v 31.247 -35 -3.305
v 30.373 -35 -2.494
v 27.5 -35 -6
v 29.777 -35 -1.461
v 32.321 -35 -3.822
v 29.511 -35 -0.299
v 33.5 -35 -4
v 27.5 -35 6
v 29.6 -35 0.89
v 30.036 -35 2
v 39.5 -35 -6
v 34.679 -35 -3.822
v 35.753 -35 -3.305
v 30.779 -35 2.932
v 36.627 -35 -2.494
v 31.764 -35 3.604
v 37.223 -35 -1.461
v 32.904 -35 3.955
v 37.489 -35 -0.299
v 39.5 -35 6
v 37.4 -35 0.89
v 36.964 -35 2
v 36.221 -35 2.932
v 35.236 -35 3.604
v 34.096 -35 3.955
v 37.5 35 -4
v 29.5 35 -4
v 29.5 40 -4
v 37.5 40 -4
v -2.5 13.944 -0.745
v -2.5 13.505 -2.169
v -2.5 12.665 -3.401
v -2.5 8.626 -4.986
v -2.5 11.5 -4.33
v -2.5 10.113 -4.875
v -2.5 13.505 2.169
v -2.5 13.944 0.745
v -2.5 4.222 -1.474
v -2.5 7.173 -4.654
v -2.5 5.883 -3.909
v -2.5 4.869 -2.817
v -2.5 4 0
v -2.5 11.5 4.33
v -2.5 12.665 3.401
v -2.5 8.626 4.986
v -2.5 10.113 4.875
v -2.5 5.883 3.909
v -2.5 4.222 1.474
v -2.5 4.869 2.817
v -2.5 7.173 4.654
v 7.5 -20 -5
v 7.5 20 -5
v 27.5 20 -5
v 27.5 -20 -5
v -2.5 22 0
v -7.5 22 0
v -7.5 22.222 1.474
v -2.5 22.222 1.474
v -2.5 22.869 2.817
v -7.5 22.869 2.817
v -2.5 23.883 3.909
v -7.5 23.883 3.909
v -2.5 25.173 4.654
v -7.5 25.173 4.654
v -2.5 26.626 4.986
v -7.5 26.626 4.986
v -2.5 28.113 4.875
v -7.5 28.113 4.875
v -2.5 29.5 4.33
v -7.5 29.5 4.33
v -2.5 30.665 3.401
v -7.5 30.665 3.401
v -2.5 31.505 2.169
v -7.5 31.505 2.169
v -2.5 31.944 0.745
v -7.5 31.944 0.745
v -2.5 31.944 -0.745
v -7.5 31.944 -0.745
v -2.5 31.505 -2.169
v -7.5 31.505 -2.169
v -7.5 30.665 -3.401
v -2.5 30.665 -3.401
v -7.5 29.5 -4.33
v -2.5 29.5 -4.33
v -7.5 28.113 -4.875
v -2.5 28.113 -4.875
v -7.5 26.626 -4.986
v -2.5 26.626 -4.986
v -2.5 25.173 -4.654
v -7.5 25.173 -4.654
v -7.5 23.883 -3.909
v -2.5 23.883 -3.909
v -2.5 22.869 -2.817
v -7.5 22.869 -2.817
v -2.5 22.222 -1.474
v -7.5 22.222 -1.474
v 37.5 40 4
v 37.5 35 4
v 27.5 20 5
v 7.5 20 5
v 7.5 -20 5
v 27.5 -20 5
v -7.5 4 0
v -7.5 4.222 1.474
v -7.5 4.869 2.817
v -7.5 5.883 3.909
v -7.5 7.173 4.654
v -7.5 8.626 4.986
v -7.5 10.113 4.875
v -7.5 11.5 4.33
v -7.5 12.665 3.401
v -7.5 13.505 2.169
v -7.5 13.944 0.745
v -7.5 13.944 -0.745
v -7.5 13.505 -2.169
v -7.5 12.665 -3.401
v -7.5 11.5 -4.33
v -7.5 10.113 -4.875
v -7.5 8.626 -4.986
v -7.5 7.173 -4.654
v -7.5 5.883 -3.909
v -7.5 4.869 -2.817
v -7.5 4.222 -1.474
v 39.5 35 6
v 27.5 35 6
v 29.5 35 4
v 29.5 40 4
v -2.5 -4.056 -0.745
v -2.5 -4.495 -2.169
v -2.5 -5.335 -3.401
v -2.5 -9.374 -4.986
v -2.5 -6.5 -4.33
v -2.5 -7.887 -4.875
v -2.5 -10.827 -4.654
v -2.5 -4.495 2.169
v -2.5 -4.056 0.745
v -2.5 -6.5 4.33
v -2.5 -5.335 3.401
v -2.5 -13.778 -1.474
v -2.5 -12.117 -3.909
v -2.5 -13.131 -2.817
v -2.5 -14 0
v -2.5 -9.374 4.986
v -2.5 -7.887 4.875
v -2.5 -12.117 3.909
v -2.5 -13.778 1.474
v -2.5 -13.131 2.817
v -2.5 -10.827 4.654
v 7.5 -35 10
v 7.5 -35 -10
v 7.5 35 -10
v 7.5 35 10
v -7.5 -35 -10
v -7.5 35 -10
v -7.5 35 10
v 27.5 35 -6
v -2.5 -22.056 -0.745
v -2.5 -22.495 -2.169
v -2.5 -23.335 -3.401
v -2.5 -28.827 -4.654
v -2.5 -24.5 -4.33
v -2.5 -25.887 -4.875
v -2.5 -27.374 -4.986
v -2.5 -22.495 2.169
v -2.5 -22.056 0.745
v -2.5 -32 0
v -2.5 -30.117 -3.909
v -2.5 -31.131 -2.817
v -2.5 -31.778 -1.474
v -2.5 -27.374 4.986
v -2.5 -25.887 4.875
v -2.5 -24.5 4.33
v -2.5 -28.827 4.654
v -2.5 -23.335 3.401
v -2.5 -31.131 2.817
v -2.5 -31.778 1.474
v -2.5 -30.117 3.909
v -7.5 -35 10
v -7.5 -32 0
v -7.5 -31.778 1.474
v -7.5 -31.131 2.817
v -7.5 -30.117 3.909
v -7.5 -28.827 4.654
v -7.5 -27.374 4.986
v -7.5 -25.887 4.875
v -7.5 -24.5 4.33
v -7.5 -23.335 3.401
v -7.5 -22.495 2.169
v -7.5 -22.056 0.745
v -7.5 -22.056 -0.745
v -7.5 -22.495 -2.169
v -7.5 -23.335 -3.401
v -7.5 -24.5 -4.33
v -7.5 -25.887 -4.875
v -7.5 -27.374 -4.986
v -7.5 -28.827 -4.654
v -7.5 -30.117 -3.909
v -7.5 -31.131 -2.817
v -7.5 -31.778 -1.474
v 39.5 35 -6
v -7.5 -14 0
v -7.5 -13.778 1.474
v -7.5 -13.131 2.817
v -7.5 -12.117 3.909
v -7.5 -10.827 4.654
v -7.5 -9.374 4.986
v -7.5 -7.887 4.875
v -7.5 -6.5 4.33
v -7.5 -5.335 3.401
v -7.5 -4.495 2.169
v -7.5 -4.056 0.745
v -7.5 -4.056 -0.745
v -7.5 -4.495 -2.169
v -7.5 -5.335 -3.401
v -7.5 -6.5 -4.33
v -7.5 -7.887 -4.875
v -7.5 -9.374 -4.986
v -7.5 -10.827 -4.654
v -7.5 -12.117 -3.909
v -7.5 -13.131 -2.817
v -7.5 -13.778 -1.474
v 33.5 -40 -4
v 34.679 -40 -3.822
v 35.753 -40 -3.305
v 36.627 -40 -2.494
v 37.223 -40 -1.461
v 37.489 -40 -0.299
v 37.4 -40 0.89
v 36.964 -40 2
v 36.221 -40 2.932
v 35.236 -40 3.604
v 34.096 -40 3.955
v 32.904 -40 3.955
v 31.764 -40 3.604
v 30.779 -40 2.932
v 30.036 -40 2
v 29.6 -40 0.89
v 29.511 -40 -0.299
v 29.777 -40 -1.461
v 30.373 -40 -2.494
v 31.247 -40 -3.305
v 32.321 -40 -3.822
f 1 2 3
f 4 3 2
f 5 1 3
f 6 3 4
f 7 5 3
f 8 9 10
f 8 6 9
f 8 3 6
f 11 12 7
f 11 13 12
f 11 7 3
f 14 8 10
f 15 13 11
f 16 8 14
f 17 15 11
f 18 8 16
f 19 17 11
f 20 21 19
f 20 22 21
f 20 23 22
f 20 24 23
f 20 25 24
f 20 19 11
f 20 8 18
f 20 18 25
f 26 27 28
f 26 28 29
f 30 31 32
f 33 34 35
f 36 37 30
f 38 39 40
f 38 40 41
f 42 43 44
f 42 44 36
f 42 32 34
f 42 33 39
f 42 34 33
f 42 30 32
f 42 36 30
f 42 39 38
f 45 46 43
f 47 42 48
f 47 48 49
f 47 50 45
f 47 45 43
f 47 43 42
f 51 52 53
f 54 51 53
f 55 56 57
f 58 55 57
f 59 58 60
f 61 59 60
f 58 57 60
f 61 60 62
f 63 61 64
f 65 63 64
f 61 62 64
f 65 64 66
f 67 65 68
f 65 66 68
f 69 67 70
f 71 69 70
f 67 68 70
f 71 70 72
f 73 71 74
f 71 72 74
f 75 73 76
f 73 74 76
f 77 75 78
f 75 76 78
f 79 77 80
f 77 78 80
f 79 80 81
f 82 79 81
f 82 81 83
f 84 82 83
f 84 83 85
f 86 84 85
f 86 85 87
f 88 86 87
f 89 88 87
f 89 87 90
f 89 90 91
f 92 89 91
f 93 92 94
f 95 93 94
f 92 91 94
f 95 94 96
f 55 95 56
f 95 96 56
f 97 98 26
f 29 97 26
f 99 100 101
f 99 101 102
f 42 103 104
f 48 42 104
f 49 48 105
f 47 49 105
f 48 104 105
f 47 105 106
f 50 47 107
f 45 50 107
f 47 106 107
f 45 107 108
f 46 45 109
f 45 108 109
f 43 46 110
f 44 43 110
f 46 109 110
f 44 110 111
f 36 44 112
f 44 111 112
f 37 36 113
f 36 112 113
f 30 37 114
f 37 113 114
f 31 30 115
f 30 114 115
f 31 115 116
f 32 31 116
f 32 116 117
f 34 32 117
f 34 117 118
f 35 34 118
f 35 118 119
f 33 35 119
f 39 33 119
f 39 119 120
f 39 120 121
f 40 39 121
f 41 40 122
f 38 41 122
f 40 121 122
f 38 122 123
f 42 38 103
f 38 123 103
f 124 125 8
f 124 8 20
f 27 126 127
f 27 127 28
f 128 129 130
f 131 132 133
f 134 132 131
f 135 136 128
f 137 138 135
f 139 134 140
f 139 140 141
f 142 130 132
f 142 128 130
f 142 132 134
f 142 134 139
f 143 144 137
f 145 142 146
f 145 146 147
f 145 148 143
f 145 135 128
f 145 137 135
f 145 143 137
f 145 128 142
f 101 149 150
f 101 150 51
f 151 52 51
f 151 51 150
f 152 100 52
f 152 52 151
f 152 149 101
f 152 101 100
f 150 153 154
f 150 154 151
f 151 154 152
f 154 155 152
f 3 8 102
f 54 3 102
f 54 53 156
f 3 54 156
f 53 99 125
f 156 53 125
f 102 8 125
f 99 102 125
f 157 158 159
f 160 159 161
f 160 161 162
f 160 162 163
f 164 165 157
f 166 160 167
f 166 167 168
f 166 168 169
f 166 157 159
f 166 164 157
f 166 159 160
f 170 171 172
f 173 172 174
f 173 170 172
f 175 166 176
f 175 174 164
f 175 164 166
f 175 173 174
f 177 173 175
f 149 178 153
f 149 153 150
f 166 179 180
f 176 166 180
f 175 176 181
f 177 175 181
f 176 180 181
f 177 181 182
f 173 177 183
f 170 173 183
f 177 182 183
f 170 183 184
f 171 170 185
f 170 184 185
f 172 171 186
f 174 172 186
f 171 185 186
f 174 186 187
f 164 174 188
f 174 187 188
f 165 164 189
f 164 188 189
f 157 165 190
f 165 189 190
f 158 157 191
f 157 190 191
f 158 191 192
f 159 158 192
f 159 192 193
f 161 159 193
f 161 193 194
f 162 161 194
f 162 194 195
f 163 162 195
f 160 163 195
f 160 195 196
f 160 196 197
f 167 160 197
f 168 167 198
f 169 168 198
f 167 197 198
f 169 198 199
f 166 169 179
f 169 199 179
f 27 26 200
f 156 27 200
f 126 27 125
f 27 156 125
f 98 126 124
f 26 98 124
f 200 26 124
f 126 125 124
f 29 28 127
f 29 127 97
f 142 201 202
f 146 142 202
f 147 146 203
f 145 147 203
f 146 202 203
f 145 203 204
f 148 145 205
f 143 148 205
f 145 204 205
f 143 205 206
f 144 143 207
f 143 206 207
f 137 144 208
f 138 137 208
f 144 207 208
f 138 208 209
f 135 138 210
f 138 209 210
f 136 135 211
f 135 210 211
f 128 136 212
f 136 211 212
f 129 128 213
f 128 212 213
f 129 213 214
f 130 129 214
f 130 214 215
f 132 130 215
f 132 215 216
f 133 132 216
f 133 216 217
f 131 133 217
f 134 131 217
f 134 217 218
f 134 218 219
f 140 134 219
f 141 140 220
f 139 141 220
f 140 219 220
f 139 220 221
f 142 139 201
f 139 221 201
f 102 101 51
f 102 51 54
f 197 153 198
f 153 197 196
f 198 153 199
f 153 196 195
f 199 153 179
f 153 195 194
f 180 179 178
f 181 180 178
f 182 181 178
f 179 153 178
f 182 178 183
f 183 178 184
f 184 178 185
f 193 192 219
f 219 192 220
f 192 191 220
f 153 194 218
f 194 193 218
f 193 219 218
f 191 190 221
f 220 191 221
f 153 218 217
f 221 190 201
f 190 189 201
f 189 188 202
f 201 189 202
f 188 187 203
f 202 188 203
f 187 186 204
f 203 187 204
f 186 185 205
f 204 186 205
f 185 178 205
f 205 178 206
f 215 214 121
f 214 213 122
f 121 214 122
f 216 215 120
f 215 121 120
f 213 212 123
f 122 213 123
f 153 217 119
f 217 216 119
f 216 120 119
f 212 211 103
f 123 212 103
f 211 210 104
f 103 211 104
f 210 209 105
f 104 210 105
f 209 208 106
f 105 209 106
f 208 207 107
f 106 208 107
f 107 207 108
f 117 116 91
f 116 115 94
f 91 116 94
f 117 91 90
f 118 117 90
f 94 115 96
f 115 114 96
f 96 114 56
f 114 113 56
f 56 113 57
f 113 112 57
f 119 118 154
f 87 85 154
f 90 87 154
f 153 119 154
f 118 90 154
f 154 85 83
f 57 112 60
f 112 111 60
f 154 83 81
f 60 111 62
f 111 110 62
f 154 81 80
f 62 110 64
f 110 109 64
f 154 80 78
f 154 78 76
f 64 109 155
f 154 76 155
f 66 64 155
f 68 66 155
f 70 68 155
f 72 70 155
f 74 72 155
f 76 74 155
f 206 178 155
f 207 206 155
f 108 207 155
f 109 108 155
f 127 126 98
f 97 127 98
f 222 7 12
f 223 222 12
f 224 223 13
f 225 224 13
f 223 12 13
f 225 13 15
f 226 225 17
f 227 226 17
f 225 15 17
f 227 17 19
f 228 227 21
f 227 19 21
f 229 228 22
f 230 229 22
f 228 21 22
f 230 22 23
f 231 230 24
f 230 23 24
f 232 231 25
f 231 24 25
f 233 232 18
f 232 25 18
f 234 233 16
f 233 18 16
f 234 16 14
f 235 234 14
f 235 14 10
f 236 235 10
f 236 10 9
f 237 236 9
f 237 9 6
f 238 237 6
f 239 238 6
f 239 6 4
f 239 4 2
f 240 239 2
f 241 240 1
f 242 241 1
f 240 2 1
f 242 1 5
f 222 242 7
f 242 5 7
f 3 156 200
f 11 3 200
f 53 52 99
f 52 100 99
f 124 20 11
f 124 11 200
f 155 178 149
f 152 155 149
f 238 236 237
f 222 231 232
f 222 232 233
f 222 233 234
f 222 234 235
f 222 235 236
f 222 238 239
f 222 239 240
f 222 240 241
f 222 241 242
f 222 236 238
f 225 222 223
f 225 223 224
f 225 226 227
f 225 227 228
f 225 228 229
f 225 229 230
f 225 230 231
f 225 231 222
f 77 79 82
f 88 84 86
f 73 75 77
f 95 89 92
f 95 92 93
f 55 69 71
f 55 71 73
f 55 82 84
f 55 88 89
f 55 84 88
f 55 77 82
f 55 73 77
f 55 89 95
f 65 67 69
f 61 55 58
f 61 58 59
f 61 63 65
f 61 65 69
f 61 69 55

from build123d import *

# Parameters (mm, degrees)
SKETCH1_W           = 15
SKETCH1_H           = 70
BOSS_EXTRUDE1_DEPTH = 10
SKETCH2_W           = 20
SKETCH2_H           = 40
BOSS_EXTRUDE2_DEPTH = 5
SKETCH5_W           = 12
SKETCH5_H           = 70
BOSS_EXTRUDE4_DEPTH = 6
SKETCH6_W           = 8
SKETCH6_H           = 8
BOSS_EXTRUDE5_DEPTH = 5
SKETCH7_R           = 4
BOSS_EXTRUDE6_DEPTH = 5
SKETCH8_R           = 5
CUT_EXTRUDE1_DEPTH  = 5


with BuildPart() as part:
    # Sketch1 → Boss-Extrude1 (new, symmetric)
    with BuildSketch(Plane.XY):
        Rectangle(SKETCH1_W, SKETCH1_H)
    extrude(amount=BOSS_EXTRUDE1_DEPTH, both=True)

    # Sketch2 → Boss-Extrude2 (add, symmetric)
    with BuildSketch(Plane.XY):
        with Locations((17.5, 0)):
            Rectangle(SKETCH2_W, SKETCH2_H)
    extrude(amount=BOSS_EXTRUDE2_DEPTH, both=True)

    # Sketch5 → Boss-Extrude4 (add, symmetric)
    with BuildSketch(Plane.XY):
        with Locations((33.5, 0)):
            Rectangle(SKETCH5_W, SKETCH5_H)
    extrude(amount=BOSS_EXTRUDE4_DEPTH, both=True)

    # Sketch6 → Boss-Extrude5 (add)
    with BuildSketch(Plane(origin=(0, 35, 0), x_dir=(1, 0, 0), z_dir=(0, 1, 0))):
        with Locations((33.5, 0)):
            Rectangle(SKETCH6_W, SKETCH6_H)
    extrude(amount=BOSS_EXTRUDE5_DEPTH)

    # Sketch7 → Boss-Extrude6 (add)
    with BuildSketch(Plane.XZ.offset(35)):
        with Locations(Location((33.5, 0, 0), (0, 0, 270))):
            Circle(SKETCH7_R)
    extrude(amount=BOSS_EXTRUDE6_DEPTH)

    # Sketch8 → Cut-Extrude1 (cut)
    with BuildSketch(Plane.ZY.offset(7.5)):
        with Locations(Location((0, 27, 0), (0, 0, 270))):
            Circle(SKETCH8_R)
        with Locations(Location((0, 9, 0), (0, 0, 270))):
            Circle(SKETCH8_R)
        with Locations(Location((0, -9, 0), (0, 0, 270))):
            Circle(SKETCH8_R)
        with Locations(Location((0, -27, 0), (0, 0, 270))):
            Circle(SKETCH8_R)
    extrude(amount=-CUT_EXTRUDE1_DEPTH, mode=Mode.SUBTRACT)


solid = part.part
